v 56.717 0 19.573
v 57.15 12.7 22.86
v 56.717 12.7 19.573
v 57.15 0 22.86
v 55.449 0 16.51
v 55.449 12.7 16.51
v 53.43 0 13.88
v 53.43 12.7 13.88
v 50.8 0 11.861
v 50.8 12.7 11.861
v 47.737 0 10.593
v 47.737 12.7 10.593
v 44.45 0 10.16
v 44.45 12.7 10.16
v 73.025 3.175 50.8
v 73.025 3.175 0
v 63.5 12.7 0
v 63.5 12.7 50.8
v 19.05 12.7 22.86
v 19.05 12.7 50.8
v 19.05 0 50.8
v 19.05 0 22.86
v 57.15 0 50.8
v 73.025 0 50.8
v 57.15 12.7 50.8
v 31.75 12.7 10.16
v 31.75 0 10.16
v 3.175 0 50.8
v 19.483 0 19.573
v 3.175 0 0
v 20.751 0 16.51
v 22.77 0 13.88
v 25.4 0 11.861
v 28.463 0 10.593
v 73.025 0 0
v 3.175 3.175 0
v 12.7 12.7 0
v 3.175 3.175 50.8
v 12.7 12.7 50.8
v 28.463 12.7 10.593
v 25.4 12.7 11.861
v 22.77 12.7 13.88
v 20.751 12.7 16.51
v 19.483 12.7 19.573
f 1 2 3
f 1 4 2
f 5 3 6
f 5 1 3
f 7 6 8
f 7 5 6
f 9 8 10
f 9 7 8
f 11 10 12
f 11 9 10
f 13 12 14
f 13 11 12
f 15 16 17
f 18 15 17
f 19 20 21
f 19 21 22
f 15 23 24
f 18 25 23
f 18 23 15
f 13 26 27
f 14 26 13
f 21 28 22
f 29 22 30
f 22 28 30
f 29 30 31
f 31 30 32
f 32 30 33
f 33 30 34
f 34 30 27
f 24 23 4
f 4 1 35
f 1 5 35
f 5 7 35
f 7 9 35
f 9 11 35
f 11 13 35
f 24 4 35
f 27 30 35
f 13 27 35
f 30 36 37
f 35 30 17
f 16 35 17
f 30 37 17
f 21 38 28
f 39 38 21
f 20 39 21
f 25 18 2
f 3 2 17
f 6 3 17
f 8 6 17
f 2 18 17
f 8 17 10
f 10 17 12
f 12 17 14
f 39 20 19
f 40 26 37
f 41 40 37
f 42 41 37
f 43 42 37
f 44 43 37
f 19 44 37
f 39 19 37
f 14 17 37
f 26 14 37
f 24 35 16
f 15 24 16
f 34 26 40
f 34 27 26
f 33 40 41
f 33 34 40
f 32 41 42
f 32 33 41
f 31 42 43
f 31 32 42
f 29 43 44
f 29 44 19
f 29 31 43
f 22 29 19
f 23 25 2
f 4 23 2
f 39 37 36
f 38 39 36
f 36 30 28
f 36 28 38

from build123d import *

# Parameters (mm, degrees)
BOSS_EXTRUDE1_DEPTH = 50.8
SKETCH2_W           = 38.1
SKETCH2_H           = 40.64
CUT_EXTRUDE1_DEPTH  = 76.2
FILLET1_R           = 12.7
SKETCH3_OUTSIDE_W   = 96.692
SKETCH3_OUTSIDE_H   = 33.192
SKETCH3_OUTSIDE_W_2 = 69.85
SKETCH3_OUTSIDE_H_2 = 12.7
CUT_EXTRUDE2_DEPTH  = 93.457395594


with BuildPart() as part:
    # Sketch1 → Boss-Extrude1 (new body)
    with BuildSketch(Plane.XY):
        Polygon((0, 0), (76.2, 0), (63.5, 12.7), (12.7, 12.7), align=None)
    extrude(amount=BOSS_EXTRUDE1_DEPTH)

    # Sketch2 → Cut-Extrude1 (cut)
    with BuildSketch(Plane(origin=(0, 12.7, 0), x_dir=(1, 0, 0), z_dir=(0, 1, 0))):
        with Locations((38.1, -30.48)):
            Rectangle(SKETCH2_W, SKETCH2_H)
    extrude(amount=-CUT_EXTRUDE1_DEPTH, mode=Mode.SUBTRACT)

    # Fillet1
    fillet1_edges = [part.edges().sort_by_distance(p)[0] for p in [
        (19.05, 6.35, 10.16),
        (57.15, 6.35, 10.16),
    ]]
    fillet(fillet1_edges, radius=FILLET1_R)

    # Sketch3 outside → Cut-Extrude2 (cut, through all)
    with BuildSketch(Plane(origin=(0, 0, 0), x_dir=(-1, 0, 0), z_dir=(0, 0, -1))):
        with Locations((-38.1, 6.35)):
            Rectangle(SKETCH3_OUTSIDE_W, SKETCH3_OUTSIDE_H)
        with Locations((-38.1, 6.35)):
            Rectangle(SKETCH3_OUTSIDE_W_2, SKETCH3_OUTSIDE_H_2, mode=Mode.SUBTRACT)
    extrude(amount=-CUT_EXTRUDE2_DEPTH, mode=Mode.SUBTRACT)


solid = part.part
